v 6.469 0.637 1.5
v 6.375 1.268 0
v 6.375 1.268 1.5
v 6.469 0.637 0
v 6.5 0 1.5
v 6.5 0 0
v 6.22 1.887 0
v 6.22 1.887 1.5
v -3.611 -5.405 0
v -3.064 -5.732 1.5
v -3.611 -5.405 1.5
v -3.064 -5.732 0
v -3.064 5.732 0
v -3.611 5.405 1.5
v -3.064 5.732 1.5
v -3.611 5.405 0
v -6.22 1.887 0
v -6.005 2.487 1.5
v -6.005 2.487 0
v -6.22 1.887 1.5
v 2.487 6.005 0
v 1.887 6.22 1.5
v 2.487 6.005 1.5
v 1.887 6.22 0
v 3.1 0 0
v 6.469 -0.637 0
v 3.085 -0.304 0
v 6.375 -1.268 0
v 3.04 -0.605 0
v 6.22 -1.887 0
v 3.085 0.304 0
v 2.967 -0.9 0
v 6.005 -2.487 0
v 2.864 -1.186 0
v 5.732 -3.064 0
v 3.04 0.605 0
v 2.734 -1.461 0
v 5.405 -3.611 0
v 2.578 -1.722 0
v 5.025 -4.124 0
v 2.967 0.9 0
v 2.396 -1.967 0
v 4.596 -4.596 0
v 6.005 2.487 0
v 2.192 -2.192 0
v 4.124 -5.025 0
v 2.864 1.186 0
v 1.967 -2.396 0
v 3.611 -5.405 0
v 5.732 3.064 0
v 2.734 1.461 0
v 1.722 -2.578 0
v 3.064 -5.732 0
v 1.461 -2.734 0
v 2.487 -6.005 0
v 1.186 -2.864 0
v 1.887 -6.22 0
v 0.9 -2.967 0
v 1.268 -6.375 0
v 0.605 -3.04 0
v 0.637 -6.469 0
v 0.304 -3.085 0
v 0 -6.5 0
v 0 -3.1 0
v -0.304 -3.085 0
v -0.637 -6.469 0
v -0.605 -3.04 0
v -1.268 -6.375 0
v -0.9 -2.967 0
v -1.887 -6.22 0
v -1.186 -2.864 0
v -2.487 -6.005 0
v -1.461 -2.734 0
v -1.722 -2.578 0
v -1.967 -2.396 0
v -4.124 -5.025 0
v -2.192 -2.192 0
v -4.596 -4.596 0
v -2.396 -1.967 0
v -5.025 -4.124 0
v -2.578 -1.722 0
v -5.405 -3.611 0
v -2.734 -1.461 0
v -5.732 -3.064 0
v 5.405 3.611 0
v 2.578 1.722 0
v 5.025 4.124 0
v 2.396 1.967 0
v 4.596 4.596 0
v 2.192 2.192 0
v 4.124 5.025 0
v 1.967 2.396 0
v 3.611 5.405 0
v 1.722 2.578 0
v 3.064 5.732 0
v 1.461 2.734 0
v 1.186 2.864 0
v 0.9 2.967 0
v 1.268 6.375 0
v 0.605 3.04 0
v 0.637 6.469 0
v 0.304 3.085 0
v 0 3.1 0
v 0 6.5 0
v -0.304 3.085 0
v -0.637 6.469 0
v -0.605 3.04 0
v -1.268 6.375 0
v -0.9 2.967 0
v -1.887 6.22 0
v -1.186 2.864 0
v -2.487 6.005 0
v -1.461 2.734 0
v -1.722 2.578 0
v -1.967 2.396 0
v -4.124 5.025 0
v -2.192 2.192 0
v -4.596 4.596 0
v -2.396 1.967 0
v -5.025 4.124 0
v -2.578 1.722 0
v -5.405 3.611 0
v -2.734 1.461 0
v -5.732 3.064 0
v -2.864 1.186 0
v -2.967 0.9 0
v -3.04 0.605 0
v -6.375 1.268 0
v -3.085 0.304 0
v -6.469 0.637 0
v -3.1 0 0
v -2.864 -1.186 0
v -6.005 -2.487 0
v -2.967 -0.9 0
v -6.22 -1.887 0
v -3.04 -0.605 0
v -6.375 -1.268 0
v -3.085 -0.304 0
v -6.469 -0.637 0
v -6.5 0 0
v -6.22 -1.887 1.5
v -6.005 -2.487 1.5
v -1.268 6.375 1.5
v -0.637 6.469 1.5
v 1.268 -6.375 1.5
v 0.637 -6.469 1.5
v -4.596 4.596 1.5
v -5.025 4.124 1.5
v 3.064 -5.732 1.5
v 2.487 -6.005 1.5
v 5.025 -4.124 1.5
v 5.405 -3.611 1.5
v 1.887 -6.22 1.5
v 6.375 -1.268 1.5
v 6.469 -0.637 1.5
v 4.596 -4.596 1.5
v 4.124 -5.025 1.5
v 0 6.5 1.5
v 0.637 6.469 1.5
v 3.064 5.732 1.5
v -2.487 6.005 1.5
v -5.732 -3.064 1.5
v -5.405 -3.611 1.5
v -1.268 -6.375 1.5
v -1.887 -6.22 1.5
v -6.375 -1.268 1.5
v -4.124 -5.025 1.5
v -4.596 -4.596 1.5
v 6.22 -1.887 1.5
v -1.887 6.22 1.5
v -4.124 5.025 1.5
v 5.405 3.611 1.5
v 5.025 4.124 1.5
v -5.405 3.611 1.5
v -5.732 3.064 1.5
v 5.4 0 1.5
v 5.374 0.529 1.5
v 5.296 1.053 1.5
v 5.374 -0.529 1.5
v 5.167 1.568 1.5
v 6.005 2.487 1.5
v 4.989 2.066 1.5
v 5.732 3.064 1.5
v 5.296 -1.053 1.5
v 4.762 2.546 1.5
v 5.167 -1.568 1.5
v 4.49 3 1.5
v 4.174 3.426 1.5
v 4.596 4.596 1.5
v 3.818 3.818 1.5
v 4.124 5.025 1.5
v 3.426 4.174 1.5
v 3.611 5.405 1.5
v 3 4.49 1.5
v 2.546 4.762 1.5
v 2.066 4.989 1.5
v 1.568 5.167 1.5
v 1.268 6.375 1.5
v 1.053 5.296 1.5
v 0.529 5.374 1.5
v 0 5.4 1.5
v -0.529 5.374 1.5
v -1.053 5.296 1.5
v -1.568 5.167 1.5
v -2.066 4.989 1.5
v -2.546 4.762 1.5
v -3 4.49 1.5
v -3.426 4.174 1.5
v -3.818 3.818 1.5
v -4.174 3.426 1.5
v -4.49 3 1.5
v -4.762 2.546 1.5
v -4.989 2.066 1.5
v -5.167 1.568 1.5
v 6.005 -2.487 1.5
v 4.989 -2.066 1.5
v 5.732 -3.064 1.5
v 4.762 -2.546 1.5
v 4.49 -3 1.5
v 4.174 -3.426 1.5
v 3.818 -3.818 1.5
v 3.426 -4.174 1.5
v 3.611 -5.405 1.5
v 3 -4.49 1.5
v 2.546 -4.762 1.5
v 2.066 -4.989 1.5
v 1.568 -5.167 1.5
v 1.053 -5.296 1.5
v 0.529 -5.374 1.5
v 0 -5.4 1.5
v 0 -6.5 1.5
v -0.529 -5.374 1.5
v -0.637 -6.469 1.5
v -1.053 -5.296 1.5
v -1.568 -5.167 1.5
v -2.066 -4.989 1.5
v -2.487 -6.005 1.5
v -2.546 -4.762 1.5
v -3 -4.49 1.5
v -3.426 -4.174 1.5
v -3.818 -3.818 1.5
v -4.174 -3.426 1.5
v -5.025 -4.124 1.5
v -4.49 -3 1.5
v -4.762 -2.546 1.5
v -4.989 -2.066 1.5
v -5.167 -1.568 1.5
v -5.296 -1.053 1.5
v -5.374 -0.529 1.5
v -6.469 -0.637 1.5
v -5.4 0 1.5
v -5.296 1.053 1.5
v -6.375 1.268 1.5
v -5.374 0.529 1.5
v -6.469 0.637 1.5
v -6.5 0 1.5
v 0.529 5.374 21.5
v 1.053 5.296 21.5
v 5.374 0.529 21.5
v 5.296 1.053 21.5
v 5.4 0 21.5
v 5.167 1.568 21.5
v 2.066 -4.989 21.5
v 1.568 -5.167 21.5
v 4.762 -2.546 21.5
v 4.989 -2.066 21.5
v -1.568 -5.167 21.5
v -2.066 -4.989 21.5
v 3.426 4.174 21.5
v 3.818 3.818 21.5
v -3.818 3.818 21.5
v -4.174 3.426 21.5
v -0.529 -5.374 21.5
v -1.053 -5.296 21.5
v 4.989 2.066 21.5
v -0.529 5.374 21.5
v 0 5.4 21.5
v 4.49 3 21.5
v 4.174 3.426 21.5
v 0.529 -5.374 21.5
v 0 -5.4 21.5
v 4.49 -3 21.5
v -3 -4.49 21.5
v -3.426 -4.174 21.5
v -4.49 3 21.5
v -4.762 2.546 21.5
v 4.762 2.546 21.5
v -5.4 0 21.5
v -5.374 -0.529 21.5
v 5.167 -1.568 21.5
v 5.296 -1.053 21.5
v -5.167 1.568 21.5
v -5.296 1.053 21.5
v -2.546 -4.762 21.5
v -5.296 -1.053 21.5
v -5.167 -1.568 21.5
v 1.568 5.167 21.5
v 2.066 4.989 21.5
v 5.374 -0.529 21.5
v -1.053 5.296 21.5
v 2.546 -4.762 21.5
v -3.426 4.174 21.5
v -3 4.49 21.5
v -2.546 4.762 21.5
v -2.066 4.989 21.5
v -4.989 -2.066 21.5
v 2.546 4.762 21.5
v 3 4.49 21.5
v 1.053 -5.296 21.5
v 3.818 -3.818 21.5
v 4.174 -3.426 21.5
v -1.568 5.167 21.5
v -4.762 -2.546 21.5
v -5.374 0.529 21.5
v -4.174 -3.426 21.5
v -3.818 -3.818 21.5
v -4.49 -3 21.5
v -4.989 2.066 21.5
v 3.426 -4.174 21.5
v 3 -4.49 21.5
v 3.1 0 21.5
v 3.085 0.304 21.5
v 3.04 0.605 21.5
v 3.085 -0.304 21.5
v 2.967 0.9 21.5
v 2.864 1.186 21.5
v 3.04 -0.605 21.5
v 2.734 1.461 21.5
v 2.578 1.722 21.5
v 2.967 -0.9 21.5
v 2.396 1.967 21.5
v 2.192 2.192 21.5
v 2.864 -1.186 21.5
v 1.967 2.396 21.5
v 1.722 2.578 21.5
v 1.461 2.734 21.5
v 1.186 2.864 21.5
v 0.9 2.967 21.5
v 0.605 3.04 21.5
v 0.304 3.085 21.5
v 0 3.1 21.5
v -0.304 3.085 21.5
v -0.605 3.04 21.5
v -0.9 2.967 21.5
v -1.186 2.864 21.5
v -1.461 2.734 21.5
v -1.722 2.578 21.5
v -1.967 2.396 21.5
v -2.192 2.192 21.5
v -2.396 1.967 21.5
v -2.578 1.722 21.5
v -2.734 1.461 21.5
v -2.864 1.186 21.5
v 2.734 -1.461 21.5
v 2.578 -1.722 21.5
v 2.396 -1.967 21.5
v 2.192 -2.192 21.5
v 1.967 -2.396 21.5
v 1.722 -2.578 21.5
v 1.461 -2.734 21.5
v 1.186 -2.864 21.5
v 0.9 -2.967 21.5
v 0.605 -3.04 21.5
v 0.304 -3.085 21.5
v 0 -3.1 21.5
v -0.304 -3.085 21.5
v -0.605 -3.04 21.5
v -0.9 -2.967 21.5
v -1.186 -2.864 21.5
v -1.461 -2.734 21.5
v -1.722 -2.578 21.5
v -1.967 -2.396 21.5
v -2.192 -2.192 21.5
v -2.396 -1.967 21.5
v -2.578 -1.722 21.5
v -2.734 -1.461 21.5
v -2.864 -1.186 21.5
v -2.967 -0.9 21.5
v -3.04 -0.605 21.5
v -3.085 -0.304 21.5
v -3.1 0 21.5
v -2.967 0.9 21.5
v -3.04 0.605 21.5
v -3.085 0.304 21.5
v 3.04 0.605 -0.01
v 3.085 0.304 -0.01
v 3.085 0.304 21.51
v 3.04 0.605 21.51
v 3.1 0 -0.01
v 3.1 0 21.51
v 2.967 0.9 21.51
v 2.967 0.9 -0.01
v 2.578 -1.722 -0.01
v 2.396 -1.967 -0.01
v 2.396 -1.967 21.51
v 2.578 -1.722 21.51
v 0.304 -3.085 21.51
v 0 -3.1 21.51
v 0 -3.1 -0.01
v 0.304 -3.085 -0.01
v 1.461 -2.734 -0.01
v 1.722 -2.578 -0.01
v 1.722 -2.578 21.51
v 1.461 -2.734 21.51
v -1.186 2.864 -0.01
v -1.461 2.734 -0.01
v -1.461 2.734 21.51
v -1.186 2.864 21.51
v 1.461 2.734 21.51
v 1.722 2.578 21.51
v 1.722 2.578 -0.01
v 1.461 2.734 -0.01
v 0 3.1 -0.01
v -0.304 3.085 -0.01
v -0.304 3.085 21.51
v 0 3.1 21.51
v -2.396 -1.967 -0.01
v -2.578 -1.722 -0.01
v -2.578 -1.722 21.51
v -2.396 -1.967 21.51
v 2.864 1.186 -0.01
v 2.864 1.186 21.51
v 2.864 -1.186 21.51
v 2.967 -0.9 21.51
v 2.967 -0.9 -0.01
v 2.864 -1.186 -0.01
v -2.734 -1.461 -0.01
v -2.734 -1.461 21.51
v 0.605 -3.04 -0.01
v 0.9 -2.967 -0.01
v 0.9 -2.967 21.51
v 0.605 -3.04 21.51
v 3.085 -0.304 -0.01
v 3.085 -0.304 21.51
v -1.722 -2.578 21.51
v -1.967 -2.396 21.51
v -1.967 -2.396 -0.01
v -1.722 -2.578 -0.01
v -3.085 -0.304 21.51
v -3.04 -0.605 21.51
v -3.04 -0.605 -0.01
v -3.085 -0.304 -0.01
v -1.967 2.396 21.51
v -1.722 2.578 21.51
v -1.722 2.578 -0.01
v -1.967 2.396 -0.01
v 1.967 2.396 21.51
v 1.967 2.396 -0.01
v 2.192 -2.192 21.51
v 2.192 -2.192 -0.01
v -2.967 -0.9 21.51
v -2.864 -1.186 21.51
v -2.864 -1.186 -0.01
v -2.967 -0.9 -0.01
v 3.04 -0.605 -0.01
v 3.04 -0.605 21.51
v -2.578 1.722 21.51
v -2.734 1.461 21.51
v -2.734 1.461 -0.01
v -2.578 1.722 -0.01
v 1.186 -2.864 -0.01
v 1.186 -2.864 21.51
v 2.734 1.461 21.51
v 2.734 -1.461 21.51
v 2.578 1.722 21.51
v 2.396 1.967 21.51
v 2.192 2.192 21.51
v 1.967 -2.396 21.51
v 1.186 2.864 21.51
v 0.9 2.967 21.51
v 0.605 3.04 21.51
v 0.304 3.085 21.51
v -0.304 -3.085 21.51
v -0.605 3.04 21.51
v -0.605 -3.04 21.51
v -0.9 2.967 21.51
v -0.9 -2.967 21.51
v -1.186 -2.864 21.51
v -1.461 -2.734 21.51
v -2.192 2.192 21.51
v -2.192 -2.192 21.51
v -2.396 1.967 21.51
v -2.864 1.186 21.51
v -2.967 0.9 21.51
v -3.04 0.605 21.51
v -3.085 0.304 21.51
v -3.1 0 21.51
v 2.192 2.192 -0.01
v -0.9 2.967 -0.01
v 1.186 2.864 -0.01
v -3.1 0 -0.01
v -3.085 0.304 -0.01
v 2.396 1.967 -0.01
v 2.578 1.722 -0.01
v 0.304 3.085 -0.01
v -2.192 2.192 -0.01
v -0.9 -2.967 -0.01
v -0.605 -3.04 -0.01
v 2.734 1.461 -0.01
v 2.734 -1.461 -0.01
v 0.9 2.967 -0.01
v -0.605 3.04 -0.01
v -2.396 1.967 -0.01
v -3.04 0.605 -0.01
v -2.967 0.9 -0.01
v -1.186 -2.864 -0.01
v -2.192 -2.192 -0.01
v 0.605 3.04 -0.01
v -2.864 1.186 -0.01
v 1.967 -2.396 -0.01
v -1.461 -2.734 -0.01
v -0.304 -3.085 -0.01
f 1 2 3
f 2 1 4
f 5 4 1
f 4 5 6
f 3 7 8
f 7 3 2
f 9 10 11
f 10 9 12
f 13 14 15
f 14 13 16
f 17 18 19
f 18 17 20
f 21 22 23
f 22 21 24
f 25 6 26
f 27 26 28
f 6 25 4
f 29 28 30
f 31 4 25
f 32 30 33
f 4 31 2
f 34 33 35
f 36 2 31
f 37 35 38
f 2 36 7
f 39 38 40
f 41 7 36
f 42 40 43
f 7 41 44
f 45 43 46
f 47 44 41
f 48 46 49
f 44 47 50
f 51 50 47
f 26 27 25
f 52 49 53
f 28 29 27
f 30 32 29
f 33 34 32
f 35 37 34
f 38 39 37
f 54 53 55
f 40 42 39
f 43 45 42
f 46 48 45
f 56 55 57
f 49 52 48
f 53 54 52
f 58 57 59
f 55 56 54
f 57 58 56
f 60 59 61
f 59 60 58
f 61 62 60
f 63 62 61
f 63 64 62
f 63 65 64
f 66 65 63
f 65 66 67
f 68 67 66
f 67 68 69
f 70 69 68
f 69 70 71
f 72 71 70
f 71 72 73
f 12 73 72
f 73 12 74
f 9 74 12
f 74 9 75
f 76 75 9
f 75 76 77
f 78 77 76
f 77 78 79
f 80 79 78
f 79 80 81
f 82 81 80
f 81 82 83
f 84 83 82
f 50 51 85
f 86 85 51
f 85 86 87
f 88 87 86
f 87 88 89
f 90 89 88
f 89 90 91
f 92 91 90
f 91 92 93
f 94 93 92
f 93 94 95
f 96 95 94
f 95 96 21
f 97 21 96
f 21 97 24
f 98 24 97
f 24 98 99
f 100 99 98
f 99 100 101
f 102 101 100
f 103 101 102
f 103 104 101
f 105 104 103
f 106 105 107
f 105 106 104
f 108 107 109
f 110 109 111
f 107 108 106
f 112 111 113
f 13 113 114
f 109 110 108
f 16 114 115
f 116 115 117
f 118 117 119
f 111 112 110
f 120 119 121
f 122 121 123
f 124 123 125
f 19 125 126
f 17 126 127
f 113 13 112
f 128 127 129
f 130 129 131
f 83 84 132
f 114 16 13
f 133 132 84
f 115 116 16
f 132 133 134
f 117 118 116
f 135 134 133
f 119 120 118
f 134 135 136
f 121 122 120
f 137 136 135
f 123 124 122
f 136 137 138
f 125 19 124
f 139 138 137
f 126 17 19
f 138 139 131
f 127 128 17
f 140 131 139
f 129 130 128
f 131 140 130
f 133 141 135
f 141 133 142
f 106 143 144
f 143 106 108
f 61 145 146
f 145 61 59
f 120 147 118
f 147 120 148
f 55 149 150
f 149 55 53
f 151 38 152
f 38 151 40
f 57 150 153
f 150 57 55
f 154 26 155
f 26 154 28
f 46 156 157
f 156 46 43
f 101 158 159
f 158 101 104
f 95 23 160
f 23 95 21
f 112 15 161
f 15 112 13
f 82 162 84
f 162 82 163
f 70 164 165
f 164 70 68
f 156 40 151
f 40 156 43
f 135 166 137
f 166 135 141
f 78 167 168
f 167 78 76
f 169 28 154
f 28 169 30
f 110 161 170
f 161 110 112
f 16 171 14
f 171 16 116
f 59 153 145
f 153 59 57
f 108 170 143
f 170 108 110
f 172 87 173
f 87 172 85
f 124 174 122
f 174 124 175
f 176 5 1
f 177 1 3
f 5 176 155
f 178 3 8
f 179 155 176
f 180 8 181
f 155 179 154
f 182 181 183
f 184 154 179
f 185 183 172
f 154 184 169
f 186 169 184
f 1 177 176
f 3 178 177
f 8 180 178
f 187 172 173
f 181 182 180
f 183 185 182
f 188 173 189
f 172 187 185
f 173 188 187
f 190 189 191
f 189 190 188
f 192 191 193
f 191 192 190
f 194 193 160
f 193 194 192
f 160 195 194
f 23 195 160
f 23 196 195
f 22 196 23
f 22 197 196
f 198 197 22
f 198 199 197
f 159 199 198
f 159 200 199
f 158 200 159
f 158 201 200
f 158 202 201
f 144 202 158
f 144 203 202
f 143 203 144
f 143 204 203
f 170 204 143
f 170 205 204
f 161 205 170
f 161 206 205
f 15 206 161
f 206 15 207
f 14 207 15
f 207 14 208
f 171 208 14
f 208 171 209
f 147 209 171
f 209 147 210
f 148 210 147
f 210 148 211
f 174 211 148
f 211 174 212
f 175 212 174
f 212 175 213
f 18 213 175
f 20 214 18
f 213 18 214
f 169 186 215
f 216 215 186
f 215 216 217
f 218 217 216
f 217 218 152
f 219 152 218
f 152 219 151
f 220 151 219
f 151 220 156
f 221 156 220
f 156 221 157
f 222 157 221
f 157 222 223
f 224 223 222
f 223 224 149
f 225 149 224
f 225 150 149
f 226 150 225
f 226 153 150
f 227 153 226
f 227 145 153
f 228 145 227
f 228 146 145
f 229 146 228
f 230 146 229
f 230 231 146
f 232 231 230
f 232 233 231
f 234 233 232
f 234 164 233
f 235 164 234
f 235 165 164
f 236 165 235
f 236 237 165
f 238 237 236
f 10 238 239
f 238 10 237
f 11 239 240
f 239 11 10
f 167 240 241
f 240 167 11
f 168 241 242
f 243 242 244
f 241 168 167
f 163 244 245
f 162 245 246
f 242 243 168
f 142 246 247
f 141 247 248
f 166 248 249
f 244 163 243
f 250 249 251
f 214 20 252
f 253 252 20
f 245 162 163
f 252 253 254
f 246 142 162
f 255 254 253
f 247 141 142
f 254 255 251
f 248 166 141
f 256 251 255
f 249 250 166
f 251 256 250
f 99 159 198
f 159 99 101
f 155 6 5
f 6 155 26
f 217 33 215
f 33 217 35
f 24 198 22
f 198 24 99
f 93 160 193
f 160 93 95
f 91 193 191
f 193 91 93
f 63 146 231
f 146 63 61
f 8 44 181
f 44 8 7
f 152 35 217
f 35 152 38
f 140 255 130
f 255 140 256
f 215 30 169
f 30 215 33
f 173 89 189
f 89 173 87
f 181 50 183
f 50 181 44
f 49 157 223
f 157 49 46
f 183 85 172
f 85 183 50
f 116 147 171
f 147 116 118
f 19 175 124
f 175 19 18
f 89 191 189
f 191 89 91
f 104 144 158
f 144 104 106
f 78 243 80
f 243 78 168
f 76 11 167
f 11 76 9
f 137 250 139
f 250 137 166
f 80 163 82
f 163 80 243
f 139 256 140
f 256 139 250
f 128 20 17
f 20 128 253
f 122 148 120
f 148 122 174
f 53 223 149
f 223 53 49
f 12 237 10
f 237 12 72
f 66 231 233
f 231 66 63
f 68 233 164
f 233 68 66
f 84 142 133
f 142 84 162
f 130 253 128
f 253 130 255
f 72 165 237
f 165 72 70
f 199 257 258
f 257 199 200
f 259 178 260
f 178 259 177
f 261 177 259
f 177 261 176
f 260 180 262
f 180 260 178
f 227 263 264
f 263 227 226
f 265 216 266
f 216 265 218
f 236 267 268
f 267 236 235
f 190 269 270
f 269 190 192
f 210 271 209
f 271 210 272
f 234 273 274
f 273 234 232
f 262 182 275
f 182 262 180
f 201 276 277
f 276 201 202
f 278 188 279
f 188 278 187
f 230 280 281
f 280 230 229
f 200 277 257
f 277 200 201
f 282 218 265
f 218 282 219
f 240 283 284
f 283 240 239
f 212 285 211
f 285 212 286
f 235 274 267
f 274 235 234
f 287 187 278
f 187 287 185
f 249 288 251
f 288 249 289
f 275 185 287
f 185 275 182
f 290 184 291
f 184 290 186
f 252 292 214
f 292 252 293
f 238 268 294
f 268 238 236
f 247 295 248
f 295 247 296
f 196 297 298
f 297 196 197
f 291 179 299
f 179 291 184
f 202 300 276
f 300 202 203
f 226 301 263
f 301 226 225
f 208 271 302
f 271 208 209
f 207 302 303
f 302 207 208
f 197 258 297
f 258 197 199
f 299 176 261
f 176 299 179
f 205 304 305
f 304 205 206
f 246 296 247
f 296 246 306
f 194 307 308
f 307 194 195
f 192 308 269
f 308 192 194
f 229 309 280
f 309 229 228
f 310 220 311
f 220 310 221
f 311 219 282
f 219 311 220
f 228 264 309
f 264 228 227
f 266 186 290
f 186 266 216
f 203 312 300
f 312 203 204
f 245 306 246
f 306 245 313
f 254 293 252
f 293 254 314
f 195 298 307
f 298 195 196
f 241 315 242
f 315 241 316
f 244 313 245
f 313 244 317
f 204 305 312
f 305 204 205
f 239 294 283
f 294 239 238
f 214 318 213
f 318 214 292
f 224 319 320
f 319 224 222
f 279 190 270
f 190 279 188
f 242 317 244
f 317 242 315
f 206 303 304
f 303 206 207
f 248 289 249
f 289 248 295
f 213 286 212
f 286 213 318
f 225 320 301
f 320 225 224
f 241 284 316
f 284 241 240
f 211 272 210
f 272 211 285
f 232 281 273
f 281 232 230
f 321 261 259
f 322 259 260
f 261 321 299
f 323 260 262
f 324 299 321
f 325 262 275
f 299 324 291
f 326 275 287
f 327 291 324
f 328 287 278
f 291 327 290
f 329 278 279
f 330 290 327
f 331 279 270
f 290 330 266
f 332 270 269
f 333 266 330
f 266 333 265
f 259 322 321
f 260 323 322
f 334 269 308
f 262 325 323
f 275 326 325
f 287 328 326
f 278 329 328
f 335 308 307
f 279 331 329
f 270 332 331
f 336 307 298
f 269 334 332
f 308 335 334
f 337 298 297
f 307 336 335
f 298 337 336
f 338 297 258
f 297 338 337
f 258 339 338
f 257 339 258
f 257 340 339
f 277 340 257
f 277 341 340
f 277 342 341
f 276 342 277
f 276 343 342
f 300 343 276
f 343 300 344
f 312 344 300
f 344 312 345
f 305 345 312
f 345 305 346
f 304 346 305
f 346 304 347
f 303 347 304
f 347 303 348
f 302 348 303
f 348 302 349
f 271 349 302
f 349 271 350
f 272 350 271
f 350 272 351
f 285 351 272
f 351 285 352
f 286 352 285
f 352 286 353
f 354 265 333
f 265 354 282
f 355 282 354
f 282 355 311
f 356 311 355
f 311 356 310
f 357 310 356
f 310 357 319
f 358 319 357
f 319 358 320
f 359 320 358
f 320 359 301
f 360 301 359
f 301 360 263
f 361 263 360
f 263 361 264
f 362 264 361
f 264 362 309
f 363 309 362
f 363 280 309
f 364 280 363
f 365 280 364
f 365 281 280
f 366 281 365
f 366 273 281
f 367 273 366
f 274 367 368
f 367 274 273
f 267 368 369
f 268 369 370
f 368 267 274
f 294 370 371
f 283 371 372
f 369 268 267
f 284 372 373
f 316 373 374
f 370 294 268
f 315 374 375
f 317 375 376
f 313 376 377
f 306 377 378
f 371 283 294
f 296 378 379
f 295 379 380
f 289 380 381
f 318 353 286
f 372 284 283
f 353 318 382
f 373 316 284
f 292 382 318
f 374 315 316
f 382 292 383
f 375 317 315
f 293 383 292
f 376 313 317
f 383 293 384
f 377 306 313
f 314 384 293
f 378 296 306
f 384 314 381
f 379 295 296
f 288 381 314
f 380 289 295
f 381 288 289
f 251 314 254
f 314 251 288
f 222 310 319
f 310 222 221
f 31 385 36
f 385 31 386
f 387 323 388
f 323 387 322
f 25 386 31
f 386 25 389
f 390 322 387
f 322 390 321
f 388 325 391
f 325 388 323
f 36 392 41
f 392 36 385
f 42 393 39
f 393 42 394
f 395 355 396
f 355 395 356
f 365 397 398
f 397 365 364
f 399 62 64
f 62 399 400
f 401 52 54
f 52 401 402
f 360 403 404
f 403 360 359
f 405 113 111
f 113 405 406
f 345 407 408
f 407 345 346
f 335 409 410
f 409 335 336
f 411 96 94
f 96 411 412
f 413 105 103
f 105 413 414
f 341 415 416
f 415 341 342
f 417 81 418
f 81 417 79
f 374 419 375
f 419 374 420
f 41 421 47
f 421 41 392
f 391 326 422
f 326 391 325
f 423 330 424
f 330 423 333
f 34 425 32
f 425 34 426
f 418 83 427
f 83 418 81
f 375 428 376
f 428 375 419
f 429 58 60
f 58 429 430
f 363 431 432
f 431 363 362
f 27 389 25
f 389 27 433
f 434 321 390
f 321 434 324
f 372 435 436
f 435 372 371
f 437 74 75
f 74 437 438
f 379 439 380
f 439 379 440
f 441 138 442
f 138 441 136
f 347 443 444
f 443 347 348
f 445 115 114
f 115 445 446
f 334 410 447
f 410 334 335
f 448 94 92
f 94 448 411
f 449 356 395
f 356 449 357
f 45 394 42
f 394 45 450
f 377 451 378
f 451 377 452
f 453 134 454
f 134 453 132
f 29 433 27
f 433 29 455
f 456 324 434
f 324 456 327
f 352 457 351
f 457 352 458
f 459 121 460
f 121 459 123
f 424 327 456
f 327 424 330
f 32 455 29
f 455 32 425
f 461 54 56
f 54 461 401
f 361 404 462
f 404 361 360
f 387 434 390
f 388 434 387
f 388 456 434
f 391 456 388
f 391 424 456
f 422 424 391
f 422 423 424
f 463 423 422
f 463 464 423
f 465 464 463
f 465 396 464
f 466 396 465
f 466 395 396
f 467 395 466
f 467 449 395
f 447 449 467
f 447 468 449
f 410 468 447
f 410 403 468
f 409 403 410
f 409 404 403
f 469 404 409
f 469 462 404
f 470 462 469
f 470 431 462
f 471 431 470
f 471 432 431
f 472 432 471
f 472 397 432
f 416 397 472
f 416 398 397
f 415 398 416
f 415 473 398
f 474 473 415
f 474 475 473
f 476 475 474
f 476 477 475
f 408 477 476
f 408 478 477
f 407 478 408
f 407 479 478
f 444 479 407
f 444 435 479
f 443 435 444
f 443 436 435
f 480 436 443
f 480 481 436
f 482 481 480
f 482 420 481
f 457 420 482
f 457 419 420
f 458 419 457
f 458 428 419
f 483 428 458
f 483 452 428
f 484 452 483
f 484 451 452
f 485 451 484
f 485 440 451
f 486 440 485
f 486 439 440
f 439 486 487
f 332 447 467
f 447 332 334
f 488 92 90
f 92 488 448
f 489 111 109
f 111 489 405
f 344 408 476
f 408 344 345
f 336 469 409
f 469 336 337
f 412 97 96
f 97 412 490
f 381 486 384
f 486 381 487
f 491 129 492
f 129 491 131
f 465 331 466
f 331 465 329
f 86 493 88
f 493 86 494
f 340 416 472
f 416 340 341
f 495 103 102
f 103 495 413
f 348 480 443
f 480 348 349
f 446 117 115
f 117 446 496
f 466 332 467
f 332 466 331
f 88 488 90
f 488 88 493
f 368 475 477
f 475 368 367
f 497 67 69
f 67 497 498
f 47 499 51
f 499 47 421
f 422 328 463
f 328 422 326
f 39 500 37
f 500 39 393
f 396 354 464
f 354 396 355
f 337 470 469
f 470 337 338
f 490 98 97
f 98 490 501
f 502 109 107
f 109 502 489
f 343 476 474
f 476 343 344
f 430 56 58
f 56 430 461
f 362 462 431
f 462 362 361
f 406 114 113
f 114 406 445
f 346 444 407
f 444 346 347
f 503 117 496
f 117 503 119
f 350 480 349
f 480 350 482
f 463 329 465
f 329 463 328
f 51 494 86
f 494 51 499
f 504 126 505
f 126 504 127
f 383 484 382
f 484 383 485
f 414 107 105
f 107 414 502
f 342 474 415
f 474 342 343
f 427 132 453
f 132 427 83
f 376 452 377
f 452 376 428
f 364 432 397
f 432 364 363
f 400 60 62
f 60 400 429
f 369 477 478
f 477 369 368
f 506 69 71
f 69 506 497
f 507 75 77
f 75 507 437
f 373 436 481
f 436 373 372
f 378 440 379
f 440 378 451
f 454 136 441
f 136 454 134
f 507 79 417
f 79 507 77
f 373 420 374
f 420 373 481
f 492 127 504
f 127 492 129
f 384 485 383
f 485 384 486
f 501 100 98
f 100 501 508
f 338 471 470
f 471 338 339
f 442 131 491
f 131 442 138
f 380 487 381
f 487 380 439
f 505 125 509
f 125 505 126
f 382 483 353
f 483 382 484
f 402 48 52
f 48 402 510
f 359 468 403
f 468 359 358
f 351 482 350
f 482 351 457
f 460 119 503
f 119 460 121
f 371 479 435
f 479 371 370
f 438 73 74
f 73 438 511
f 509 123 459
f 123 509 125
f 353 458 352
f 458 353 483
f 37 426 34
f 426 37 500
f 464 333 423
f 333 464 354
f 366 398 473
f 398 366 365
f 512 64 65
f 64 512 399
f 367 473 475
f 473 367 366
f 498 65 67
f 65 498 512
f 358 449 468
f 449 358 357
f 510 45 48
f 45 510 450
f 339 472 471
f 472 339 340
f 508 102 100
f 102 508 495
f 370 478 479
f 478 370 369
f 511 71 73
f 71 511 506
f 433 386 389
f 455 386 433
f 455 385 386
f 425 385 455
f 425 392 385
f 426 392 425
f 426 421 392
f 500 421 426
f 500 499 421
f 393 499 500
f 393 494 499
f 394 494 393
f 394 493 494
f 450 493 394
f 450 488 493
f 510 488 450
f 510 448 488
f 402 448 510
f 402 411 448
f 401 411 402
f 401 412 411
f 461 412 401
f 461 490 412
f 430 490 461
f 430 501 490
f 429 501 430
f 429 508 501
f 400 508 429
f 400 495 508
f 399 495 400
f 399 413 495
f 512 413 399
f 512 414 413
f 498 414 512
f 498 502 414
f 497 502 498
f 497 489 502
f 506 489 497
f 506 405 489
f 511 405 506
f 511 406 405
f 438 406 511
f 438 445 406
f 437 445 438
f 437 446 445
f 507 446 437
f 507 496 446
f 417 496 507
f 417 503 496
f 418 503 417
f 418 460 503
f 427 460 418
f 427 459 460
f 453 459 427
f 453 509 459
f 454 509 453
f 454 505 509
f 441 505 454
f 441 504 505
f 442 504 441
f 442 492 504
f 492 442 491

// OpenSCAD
// Adapter sleeve: 0.2 mL PCR tube in 1.5 mL rack hole
// Print orientation: collar on bed (z=0), sleeve rises upward

// --- Dimensions (mm) ---
COLLAR_OD       = 13.0;    // Collar outer diameter
COLLAR_THICK    = 1.5;     // Collar thickness (height)
SLEEVE_OD       = 10.8;    // Sleeve outer diameter
SLEEVE_HEIGHT   = 21.5;   // Total height from bed to top
BORE_DIA        = 6.2;     // Inner bore diameter

// --- Parameters ---
$fn = 64;

// --- Build ---
module adapter_sleeve() {
    union() {
        // Collar (base ring)
        cylinder(d = COLLAR_OD, h = COLLAR_THICK);
        
        // Sleeve body (rises from collar)
        translate([0, 0, COLLAR_THICK]) {
            cylinder(d = SLEEVE_OD, h = SLEEVE_HEIGHT - COLLAR_THICK);
        }
        
        // Bore (through entire height)
        translate([0, 0, -0.01]) {
            cylinder(d = BORE_DIA, h = SLEEVE_HEIGHT + 0.02);
        }
    }
}

adapter_sleeve();
